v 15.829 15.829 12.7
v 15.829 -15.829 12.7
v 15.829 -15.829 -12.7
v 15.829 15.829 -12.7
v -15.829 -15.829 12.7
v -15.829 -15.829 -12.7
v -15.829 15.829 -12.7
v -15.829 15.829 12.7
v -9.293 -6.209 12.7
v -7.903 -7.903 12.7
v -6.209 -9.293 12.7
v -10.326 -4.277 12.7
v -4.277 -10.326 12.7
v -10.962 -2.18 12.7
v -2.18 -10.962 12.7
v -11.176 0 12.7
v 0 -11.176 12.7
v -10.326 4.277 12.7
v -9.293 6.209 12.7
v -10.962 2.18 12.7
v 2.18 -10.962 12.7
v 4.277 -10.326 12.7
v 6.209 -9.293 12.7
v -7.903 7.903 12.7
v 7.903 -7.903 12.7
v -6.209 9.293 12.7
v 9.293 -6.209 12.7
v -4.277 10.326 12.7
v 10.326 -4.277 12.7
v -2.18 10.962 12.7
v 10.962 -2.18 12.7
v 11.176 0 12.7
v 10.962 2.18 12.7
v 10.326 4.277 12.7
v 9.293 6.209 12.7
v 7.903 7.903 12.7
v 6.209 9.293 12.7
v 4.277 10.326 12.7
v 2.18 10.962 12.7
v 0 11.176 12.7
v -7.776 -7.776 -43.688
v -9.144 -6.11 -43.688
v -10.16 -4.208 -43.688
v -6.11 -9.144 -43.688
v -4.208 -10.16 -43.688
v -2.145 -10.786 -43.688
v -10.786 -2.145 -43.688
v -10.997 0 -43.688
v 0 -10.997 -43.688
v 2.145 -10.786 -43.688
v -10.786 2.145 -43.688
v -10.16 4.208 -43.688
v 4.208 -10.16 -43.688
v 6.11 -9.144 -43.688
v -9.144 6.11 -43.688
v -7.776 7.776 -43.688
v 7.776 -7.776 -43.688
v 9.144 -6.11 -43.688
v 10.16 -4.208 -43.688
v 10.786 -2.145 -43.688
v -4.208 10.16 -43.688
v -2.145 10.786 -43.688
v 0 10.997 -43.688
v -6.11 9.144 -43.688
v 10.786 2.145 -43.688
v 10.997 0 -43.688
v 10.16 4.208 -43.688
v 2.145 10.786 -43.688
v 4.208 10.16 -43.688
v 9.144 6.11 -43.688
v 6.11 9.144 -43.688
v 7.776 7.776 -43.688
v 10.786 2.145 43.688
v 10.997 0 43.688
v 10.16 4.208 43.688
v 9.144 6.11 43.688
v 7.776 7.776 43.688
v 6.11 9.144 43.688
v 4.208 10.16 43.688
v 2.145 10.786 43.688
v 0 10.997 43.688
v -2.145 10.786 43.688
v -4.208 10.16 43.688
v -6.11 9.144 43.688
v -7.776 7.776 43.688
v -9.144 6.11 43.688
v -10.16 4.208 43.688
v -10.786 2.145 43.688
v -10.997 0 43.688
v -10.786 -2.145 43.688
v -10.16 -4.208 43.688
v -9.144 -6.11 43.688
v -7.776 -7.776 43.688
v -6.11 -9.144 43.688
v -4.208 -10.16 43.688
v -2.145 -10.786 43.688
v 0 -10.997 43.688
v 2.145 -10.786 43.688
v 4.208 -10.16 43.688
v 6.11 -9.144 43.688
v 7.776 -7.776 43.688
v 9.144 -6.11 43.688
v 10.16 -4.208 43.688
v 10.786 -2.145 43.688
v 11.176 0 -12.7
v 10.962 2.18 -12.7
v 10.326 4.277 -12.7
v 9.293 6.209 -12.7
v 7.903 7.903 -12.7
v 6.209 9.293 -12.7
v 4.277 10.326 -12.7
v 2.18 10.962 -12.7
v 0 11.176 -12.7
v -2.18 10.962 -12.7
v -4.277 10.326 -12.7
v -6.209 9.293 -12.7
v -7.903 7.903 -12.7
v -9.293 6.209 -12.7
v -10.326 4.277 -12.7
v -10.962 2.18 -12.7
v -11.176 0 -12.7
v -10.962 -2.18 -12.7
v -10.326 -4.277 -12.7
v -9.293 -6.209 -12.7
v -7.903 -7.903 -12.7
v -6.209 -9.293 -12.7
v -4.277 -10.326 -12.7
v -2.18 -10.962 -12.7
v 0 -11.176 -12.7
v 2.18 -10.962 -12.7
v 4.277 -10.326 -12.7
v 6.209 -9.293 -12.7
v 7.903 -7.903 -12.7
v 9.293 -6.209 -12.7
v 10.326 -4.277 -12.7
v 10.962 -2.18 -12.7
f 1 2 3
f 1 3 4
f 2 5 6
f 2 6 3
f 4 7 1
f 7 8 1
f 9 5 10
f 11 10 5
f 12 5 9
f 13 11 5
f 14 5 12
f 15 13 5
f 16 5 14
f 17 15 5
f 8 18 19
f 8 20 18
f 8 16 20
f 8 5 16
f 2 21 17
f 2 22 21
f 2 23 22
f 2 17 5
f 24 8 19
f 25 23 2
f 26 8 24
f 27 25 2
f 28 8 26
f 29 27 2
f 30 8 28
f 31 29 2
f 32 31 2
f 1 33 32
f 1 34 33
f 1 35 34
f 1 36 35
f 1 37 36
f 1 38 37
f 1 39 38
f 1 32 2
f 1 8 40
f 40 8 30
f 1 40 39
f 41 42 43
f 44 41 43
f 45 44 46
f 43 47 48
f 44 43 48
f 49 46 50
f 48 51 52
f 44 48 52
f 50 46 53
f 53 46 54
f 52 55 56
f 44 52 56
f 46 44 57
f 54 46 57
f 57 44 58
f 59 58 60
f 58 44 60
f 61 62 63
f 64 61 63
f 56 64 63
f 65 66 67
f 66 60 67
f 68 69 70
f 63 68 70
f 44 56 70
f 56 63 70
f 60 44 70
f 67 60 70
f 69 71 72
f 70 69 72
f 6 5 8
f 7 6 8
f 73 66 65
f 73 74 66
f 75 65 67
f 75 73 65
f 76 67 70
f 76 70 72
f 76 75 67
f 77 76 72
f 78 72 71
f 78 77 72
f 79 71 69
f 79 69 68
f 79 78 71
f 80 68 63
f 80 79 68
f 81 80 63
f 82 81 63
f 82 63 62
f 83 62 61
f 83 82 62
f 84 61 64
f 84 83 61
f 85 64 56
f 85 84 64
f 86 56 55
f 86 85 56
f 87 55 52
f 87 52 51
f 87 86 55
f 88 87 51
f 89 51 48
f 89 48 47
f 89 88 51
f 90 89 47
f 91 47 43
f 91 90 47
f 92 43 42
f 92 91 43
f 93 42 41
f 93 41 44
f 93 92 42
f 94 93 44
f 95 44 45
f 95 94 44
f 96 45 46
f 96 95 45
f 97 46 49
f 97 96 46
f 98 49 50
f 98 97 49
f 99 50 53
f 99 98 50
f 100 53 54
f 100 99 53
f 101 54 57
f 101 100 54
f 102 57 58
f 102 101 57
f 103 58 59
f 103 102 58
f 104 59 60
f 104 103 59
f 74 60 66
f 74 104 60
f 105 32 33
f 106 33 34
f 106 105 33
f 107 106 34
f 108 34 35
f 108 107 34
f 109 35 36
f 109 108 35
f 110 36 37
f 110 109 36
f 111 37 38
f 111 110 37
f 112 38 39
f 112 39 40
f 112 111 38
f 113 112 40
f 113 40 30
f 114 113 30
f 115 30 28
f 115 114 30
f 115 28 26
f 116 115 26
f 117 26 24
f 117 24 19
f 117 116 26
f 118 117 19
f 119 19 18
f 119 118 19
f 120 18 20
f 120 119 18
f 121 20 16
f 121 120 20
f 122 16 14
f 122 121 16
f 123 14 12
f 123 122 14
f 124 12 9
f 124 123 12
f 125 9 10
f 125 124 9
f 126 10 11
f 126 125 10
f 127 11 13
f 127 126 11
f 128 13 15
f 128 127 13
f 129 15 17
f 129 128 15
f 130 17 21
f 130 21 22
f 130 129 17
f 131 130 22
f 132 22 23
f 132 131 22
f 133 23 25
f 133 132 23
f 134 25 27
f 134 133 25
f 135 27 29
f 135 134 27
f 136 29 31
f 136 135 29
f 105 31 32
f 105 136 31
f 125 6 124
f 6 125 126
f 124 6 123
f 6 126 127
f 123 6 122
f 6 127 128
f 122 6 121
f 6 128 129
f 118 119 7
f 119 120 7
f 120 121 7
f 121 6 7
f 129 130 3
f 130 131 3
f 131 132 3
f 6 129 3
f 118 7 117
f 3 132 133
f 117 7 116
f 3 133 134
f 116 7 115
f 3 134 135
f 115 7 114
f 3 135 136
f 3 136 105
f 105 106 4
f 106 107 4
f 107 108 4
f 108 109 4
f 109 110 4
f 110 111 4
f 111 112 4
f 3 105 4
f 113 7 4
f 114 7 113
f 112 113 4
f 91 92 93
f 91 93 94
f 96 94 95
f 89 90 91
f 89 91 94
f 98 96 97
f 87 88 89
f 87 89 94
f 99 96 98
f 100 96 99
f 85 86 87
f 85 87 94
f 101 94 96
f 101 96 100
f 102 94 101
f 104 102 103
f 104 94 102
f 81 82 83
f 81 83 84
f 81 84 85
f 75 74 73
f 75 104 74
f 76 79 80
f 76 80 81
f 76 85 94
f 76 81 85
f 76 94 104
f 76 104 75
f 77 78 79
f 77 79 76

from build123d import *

# Parameters (mm, degrees)
F0_W     = 31.658634
F0_H     = 31.658634
F0_R     = 11.176355
F1_DEPTH = 12.7
F2_R     = 10.997043
F3_DEPTH = 43.688


with BuildPart() as f1:
    # F0 (on Top) → F1 (new body, symmetric)
    with BuildSketch(Plane.XY):
        Rectangle(F0_W, F0_H)
        Circle(F0_R, mode=Mode.SUBTRACT)
    extrude(amount=F1_DEPTH, both=True)


with BuildPart() as f3:
    # F2 (on Top) → F3 (new body, symmetric)
    with BuildSketch(Plane.XY):
        Circle(F2_R)
    extrude(amount=F3_DEPTH, both=True)


solid = Compound([f1.part, f3.part])
